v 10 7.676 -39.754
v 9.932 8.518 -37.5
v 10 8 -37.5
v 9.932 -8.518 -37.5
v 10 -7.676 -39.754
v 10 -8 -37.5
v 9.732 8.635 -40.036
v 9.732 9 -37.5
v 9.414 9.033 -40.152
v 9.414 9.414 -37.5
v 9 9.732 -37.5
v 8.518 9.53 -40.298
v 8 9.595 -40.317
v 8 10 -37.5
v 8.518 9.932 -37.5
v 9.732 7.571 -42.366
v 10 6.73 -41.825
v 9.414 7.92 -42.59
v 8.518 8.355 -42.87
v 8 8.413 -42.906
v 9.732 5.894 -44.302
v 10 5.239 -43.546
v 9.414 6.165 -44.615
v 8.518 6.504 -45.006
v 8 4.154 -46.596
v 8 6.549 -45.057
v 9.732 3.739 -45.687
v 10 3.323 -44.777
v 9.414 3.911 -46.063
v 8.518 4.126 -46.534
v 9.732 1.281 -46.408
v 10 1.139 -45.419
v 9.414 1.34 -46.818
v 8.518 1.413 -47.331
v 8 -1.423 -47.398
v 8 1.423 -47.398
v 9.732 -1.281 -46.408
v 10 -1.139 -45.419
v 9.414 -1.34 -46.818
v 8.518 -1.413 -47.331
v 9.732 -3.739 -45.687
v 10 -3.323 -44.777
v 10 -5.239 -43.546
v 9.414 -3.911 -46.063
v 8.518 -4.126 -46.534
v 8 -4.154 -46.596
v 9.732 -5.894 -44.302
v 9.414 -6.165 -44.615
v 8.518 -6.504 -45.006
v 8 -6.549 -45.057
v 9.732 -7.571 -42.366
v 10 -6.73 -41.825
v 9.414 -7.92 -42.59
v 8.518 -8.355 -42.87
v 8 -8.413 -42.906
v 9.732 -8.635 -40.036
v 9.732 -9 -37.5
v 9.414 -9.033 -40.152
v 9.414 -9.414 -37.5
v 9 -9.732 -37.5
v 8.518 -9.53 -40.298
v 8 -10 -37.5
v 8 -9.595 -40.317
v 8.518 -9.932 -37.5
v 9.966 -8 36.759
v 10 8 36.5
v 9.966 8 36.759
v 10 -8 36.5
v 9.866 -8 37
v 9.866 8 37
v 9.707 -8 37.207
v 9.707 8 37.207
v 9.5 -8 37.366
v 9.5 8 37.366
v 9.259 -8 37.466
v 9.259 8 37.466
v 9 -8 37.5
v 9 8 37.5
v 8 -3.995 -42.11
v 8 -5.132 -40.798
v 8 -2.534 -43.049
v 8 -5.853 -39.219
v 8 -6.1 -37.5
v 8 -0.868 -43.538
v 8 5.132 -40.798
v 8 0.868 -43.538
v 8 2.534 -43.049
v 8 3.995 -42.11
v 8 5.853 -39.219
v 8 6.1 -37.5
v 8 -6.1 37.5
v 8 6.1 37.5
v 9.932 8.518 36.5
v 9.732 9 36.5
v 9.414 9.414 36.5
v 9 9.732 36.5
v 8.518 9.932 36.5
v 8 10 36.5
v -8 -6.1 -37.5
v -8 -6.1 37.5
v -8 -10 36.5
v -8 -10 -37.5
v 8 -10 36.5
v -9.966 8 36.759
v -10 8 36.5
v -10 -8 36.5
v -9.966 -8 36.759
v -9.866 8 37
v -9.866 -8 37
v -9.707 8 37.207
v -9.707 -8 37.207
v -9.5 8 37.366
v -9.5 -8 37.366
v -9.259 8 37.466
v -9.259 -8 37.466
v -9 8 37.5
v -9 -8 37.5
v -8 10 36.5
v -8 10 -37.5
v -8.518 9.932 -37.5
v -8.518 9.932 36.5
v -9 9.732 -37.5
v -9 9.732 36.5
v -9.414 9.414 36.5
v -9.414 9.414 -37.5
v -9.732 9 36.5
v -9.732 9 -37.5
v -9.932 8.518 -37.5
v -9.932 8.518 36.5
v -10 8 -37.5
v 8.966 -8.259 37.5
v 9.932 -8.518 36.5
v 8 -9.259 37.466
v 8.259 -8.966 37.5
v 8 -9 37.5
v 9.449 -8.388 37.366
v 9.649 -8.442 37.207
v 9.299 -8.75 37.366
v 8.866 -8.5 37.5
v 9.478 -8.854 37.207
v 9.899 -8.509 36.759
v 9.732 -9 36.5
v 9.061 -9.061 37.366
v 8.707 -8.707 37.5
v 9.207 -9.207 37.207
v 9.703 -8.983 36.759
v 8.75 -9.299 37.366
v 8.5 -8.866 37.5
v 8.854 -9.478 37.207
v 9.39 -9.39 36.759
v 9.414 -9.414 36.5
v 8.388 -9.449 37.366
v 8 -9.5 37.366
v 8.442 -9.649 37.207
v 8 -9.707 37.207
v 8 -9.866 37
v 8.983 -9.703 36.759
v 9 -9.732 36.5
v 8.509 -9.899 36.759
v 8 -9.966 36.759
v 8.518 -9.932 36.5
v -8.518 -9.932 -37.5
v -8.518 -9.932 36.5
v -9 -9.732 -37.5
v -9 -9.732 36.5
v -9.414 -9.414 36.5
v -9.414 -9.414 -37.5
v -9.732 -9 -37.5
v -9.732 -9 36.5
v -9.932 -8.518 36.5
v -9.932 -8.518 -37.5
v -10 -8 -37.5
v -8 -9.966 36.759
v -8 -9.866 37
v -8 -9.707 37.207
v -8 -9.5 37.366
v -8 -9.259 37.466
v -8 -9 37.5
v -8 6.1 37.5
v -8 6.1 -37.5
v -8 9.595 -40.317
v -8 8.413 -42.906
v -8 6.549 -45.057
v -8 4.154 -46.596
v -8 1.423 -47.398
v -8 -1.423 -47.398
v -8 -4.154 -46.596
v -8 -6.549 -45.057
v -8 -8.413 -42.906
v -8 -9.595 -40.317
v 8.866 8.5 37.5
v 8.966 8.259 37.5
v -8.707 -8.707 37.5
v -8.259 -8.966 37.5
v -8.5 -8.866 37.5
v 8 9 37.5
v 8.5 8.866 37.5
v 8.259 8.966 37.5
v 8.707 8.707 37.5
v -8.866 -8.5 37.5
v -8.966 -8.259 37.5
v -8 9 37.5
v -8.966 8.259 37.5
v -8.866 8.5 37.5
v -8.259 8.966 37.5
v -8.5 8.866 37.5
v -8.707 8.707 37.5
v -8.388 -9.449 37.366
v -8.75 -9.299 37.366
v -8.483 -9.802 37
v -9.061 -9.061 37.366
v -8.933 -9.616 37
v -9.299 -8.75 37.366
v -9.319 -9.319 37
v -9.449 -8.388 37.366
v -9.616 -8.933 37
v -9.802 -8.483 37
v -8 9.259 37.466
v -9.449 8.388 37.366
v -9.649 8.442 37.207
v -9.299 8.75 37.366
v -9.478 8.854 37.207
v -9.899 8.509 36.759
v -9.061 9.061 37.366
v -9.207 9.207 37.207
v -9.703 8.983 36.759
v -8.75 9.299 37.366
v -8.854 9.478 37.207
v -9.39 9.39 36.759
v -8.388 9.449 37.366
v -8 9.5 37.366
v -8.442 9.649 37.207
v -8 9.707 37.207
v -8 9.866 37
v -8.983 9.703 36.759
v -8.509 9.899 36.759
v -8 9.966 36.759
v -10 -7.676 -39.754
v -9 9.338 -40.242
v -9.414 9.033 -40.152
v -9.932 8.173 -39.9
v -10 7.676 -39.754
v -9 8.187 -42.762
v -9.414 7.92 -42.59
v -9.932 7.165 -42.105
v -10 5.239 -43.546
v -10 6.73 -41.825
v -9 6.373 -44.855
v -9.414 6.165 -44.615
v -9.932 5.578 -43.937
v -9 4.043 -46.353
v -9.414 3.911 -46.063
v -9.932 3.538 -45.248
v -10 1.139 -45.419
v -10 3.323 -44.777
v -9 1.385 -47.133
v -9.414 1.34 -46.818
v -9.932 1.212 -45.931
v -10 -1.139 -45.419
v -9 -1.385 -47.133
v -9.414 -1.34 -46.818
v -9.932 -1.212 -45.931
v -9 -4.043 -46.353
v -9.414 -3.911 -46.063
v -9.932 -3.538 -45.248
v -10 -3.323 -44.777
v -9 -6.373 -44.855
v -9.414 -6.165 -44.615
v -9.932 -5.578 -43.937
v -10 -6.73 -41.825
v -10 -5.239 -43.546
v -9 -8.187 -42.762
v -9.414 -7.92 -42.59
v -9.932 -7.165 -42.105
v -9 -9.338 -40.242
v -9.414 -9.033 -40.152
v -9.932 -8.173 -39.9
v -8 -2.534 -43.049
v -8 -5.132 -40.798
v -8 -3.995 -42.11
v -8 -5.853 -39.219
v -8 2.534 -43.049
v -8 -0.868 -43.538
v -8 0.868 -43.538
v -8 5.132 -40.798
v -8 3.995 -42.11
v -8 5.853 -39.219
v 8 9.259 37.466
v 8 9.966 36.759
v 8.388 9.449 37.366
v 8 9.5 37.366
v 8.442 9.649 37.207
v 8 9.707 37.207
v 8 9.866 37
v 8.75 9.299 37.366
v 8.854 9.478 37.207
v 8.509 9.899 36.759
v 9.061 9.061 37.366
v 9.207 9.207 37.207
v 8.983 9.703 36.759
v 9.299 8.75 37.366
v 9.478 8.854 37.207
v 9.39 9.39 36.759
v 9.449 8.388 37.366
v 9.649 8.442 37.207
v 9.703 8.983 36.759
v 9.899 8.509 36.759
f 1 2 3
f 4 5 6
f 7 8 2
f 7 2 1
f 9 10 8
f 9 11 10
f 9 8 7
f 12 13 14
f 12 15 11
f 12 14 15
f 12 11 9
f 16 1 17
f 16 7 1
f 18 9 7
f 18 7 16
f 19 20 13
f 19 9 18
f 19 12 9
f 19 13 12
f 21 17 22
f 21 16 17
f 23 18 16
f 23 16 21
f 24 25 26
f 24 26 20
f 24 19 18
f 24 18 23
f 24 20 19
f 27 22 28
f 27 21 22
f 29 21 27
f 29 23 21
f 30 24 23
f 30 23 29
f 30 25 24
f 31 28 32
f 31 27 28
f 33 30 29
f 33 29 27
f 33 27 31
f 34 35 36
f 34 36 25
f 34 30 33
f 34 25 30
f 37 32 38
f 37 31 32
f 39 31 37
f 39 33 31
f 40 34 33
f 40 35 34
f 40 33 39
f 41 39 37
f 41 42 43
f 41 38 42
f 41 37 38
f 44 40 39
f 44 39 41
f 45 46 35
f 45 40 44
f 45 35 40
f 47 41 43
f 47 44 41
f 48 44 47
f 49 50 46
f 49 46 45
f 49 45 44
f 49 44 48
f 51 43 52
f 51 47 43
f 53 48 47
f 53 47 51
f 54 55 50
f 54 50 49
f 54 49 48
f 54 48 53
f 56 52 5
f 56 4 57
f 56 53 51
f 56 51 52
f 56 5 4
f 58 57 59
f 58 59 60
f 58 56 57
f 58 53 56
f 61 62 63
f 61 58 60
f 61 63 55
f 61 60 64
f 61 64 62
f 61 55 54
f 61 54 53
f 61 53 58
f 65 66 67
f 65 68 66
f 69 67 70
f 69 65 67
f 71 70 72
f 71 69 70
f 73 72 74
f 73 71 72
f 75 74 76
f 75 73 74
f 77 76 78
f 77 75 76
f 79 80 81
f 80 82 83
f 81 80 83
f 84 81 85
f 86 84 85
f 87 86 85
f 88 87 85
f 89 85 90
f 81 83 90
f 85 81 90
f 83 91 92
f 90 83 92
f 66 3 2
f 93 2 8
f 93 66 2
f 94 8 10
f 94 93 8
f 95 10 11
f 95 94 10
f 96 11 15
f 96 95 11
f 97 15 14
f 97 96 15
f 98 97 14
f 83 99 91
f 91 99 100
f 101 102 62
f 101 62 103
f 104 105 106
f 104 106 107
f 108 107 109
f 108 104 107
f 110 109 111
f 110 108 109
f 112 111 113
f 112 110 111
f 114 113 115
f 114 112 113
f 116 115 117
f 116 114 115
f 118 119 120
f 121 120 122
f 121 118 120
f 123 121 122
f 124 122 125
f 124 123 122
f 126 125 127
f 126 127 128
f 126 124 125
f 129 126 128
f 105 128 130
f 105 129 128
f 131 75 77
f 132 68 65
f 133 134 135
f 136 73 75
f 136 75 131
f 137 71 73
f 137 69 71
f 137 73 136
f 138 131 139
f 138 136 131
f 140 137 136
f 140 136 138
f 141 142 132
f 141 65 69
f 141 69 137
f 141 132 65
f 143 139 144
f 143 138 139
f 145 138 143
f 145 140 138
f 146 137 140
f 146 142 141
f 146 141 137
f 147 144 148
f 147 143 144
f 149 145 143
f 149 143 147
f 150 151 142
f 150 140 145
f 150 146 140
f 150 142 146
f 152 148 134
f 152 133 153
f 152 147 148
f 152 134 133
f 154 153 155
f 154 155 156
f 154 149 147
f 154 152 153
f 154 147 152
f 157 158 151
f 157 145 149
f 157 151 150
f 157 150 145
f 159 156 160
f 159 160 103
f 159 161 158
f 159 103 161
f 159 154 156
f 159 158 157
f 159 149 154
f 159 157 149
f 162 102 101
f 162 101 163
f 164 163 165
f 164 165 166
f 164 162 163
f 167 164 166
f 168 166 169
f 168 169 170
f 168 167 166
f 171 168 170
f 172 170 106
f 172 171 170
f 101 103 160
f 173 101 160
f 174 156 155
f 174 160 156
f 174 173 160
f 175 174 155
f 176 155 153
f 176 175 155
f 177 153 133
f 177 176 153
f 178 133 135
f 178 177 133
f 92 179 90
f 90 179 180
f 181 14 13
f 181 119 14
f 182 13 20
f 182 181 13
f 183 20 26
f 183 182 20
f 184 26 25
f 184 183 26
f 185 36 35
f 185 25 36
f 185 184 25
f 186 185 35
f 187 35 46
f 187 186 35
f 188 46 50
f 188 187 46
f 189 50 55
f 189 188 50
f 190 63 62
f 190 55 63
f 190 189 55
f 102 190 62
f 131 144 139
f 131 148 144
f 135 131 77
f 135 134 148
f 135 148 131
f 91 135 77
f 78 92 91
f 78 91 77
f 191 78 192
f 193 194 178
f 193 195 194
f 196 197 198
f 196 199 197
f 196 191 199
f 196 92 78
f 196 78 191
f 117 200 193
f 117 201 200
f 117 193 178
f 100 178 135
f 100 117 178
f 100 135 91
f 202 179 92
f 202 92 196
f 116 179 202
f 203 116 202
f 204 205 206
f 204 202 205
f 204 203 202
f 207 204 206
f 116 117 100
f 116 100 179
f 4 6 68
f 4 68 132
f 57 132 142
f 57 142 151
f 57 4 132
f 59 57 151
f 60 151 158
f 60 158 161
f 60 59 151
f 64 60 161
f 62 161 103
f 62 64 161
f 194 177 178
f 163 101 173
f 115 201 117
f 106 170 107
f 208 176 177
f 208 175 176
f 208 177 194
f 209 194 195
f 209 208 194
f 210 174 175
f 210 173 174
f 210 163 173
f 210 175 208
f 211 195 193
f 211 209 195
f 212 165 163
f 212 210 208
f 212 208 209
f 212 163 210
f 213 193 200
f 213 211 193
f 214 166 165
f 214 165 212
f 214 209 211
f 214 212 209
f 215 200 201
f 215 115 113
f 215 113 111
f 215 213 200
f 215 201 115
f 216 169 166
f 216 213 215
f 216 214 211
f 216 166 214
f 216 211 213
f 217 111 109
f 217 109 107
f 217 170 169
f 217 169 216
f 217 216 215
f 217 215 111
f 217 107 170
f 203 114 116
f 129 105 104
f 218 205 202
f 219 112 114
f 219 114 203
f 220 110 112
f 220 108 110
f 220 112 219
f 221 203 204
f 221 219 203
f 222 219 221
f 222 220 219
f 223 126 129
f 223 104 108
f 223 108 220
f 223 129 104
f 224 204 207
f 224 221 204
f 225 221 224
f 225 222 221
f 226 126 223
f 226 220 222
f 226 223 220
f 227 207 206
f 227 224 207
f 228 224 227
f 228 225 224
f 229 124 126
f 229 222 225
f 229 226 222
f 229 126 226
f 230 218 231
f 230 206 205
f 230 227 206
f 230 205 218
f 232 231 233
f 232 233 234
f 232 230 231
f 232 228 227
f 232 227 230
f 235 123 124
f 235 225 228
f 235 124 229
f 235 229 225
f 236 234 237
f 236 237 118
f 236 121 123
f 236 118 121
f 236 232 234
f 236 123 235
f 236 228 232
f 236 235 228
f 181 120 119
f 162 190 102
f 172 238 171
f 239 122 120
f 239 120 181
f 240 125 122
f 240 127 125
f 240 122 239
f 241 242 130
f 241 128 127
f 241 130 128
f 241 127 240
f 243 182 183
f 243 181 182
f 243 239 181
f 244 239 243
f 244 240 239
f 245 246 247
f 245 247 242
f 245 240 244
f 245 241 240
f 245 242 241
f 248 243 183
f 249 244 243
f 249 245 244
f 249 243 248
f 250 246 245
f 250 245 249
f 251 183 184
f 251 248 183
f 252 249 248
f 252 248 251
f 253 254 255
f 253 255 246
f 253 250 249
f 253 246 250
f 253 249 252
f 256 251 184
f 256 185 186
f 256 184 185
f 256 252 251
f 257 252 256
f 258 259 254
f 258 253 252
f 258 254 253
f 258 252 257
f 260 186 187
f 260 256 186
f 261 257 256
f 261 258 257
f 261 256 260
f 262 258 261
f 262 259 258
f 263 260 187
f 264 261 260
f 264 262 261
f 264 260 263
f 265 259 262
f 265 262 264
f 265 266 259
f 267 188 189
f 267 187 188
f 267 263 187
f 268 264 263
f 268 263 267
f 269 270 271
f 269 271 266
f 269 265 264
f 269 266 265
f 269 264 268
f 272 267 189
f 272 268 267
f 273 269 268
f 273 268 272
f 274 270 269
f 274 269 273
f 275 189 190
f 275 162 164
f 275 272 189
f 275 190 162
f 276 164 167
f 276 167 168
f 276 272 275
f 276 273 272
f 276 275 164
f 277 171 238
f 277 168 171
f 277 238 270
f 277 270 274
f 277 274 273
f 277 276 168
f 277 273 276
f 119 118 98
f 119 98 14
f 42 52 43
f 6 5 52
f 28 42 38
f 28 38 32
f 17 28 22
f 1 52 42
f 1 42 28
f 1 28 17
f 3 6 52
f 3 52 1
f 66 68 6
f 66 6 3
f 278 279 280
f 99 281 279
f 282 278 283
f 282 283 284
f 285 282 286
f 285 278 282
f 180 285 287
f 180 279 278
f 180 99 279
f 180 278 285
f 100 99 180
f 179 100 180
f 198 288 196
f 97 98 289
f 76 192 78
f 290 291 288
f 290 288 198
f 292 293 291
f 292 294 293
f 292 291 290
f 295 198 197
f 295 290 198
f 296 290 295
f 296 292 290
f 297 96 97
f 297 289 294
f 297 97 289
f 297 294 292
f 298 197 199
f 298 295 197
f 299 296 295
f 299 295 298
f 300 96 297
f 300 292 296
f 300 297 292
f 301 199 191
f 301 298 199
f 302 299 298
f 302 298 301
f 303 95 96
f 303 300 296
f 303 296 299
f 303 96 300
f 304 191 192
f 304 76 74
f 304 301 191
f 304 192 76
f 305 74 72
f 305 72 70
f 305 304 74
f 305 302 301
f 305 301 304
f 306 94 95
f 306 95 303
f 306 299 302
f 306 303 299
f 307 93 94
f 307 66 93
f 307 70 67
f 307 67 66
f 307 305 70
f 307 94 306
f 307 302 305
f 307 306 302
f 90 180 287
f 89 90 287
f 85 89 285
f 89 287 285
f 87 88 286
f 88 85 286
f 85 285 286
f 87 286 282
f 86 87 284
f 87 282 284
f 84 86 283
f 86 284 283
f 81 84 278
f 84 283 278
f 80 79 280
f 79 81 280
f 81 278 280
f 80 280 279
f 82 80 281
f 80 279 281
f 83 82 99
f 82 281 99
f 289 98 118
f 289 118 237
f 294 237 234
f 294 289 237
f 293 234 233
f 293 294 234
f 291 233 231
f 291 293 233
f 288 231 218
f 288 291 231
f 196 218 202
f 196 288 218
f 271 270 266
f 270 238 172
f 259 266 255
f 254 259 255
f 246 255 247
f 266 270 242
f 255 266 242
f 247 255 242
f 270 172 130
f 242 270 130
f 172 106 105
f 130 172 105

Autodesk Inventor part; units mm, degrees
ref_plane "YZ Plane" through (0, 0, 0) normal (1, 0, 0) x (0, 1, 0)
ref_plane "XZ Plane" through (0, 0, 0) normal (0, 1, 0) x (-1, 0, 0)
ref_plane "XY Plane" through (0, 0, 0) normal (0, 0, 1) x (1, 0, 0)
sketch "Sketch1" plane through (0, 0, 0) normal (1, 0, 0) x (0, 1, 0)
  line L0 (10, 37.5) -> (10, -37.5)
  arc A0 (-10, -37.5) -> (10, -37.5) centre (0, -37.5) ccw
  line L1 (-10, -37.5) -> (-10, 37.5)
  line L2 (-10, 37.5) -> (10, 37.5)
  point P0 (0, 0)
  point P1 (-10, 0)
  dimension "d0" = 20
  dimension "d1" = 75
  dimension "d2" = 10
extrude "Extrusion1" add sketch "Sketch1" along normal mid plane 20
sketch "Sketch2" plane through (0, 0, 0) normal (1, 0, 0) x (0, 1, 0)
  line L0 (-10, 37.5) -> (10, 37.5) projected
  line L1 (6.1, 37.5) -> (6.1, -37.5)
  arc A0 (-6.1, -37.5) -> (6.1, -37.5) centre (0, -37.5) ccw
  line L2 (-6.1, -37.5) -> (-6.1, 37.5)
  point P0 (0, 0)
  dimension "d5" = 75
  dimension "d6" = 12.2
extrude "Extrusion2" cut sketch "Sketch2" along normal mid plane 16
fillet "Fillet1" radius 2 6 edges at (-10, 0, -47.5) (-10, 10, 0) (-10, -10, 0) (10, 0, -47.5) (10, 10, 0) (10, -10, 0)
fillet "Fillet2" radius 1 8 edges at (-9.4142, -9.4142, 37.5) (-10, 0, 37.5) (-9.4142, 9.4142, 37.5) (0, 10, 37.5) (9.4142, 9.4142, 37.5) (10, 0, 37.5) (9.4142, -9.4142, 37.5) (0, -10, 37.5)
properties part number "Part5_GOMA" material "Polystyrene"
